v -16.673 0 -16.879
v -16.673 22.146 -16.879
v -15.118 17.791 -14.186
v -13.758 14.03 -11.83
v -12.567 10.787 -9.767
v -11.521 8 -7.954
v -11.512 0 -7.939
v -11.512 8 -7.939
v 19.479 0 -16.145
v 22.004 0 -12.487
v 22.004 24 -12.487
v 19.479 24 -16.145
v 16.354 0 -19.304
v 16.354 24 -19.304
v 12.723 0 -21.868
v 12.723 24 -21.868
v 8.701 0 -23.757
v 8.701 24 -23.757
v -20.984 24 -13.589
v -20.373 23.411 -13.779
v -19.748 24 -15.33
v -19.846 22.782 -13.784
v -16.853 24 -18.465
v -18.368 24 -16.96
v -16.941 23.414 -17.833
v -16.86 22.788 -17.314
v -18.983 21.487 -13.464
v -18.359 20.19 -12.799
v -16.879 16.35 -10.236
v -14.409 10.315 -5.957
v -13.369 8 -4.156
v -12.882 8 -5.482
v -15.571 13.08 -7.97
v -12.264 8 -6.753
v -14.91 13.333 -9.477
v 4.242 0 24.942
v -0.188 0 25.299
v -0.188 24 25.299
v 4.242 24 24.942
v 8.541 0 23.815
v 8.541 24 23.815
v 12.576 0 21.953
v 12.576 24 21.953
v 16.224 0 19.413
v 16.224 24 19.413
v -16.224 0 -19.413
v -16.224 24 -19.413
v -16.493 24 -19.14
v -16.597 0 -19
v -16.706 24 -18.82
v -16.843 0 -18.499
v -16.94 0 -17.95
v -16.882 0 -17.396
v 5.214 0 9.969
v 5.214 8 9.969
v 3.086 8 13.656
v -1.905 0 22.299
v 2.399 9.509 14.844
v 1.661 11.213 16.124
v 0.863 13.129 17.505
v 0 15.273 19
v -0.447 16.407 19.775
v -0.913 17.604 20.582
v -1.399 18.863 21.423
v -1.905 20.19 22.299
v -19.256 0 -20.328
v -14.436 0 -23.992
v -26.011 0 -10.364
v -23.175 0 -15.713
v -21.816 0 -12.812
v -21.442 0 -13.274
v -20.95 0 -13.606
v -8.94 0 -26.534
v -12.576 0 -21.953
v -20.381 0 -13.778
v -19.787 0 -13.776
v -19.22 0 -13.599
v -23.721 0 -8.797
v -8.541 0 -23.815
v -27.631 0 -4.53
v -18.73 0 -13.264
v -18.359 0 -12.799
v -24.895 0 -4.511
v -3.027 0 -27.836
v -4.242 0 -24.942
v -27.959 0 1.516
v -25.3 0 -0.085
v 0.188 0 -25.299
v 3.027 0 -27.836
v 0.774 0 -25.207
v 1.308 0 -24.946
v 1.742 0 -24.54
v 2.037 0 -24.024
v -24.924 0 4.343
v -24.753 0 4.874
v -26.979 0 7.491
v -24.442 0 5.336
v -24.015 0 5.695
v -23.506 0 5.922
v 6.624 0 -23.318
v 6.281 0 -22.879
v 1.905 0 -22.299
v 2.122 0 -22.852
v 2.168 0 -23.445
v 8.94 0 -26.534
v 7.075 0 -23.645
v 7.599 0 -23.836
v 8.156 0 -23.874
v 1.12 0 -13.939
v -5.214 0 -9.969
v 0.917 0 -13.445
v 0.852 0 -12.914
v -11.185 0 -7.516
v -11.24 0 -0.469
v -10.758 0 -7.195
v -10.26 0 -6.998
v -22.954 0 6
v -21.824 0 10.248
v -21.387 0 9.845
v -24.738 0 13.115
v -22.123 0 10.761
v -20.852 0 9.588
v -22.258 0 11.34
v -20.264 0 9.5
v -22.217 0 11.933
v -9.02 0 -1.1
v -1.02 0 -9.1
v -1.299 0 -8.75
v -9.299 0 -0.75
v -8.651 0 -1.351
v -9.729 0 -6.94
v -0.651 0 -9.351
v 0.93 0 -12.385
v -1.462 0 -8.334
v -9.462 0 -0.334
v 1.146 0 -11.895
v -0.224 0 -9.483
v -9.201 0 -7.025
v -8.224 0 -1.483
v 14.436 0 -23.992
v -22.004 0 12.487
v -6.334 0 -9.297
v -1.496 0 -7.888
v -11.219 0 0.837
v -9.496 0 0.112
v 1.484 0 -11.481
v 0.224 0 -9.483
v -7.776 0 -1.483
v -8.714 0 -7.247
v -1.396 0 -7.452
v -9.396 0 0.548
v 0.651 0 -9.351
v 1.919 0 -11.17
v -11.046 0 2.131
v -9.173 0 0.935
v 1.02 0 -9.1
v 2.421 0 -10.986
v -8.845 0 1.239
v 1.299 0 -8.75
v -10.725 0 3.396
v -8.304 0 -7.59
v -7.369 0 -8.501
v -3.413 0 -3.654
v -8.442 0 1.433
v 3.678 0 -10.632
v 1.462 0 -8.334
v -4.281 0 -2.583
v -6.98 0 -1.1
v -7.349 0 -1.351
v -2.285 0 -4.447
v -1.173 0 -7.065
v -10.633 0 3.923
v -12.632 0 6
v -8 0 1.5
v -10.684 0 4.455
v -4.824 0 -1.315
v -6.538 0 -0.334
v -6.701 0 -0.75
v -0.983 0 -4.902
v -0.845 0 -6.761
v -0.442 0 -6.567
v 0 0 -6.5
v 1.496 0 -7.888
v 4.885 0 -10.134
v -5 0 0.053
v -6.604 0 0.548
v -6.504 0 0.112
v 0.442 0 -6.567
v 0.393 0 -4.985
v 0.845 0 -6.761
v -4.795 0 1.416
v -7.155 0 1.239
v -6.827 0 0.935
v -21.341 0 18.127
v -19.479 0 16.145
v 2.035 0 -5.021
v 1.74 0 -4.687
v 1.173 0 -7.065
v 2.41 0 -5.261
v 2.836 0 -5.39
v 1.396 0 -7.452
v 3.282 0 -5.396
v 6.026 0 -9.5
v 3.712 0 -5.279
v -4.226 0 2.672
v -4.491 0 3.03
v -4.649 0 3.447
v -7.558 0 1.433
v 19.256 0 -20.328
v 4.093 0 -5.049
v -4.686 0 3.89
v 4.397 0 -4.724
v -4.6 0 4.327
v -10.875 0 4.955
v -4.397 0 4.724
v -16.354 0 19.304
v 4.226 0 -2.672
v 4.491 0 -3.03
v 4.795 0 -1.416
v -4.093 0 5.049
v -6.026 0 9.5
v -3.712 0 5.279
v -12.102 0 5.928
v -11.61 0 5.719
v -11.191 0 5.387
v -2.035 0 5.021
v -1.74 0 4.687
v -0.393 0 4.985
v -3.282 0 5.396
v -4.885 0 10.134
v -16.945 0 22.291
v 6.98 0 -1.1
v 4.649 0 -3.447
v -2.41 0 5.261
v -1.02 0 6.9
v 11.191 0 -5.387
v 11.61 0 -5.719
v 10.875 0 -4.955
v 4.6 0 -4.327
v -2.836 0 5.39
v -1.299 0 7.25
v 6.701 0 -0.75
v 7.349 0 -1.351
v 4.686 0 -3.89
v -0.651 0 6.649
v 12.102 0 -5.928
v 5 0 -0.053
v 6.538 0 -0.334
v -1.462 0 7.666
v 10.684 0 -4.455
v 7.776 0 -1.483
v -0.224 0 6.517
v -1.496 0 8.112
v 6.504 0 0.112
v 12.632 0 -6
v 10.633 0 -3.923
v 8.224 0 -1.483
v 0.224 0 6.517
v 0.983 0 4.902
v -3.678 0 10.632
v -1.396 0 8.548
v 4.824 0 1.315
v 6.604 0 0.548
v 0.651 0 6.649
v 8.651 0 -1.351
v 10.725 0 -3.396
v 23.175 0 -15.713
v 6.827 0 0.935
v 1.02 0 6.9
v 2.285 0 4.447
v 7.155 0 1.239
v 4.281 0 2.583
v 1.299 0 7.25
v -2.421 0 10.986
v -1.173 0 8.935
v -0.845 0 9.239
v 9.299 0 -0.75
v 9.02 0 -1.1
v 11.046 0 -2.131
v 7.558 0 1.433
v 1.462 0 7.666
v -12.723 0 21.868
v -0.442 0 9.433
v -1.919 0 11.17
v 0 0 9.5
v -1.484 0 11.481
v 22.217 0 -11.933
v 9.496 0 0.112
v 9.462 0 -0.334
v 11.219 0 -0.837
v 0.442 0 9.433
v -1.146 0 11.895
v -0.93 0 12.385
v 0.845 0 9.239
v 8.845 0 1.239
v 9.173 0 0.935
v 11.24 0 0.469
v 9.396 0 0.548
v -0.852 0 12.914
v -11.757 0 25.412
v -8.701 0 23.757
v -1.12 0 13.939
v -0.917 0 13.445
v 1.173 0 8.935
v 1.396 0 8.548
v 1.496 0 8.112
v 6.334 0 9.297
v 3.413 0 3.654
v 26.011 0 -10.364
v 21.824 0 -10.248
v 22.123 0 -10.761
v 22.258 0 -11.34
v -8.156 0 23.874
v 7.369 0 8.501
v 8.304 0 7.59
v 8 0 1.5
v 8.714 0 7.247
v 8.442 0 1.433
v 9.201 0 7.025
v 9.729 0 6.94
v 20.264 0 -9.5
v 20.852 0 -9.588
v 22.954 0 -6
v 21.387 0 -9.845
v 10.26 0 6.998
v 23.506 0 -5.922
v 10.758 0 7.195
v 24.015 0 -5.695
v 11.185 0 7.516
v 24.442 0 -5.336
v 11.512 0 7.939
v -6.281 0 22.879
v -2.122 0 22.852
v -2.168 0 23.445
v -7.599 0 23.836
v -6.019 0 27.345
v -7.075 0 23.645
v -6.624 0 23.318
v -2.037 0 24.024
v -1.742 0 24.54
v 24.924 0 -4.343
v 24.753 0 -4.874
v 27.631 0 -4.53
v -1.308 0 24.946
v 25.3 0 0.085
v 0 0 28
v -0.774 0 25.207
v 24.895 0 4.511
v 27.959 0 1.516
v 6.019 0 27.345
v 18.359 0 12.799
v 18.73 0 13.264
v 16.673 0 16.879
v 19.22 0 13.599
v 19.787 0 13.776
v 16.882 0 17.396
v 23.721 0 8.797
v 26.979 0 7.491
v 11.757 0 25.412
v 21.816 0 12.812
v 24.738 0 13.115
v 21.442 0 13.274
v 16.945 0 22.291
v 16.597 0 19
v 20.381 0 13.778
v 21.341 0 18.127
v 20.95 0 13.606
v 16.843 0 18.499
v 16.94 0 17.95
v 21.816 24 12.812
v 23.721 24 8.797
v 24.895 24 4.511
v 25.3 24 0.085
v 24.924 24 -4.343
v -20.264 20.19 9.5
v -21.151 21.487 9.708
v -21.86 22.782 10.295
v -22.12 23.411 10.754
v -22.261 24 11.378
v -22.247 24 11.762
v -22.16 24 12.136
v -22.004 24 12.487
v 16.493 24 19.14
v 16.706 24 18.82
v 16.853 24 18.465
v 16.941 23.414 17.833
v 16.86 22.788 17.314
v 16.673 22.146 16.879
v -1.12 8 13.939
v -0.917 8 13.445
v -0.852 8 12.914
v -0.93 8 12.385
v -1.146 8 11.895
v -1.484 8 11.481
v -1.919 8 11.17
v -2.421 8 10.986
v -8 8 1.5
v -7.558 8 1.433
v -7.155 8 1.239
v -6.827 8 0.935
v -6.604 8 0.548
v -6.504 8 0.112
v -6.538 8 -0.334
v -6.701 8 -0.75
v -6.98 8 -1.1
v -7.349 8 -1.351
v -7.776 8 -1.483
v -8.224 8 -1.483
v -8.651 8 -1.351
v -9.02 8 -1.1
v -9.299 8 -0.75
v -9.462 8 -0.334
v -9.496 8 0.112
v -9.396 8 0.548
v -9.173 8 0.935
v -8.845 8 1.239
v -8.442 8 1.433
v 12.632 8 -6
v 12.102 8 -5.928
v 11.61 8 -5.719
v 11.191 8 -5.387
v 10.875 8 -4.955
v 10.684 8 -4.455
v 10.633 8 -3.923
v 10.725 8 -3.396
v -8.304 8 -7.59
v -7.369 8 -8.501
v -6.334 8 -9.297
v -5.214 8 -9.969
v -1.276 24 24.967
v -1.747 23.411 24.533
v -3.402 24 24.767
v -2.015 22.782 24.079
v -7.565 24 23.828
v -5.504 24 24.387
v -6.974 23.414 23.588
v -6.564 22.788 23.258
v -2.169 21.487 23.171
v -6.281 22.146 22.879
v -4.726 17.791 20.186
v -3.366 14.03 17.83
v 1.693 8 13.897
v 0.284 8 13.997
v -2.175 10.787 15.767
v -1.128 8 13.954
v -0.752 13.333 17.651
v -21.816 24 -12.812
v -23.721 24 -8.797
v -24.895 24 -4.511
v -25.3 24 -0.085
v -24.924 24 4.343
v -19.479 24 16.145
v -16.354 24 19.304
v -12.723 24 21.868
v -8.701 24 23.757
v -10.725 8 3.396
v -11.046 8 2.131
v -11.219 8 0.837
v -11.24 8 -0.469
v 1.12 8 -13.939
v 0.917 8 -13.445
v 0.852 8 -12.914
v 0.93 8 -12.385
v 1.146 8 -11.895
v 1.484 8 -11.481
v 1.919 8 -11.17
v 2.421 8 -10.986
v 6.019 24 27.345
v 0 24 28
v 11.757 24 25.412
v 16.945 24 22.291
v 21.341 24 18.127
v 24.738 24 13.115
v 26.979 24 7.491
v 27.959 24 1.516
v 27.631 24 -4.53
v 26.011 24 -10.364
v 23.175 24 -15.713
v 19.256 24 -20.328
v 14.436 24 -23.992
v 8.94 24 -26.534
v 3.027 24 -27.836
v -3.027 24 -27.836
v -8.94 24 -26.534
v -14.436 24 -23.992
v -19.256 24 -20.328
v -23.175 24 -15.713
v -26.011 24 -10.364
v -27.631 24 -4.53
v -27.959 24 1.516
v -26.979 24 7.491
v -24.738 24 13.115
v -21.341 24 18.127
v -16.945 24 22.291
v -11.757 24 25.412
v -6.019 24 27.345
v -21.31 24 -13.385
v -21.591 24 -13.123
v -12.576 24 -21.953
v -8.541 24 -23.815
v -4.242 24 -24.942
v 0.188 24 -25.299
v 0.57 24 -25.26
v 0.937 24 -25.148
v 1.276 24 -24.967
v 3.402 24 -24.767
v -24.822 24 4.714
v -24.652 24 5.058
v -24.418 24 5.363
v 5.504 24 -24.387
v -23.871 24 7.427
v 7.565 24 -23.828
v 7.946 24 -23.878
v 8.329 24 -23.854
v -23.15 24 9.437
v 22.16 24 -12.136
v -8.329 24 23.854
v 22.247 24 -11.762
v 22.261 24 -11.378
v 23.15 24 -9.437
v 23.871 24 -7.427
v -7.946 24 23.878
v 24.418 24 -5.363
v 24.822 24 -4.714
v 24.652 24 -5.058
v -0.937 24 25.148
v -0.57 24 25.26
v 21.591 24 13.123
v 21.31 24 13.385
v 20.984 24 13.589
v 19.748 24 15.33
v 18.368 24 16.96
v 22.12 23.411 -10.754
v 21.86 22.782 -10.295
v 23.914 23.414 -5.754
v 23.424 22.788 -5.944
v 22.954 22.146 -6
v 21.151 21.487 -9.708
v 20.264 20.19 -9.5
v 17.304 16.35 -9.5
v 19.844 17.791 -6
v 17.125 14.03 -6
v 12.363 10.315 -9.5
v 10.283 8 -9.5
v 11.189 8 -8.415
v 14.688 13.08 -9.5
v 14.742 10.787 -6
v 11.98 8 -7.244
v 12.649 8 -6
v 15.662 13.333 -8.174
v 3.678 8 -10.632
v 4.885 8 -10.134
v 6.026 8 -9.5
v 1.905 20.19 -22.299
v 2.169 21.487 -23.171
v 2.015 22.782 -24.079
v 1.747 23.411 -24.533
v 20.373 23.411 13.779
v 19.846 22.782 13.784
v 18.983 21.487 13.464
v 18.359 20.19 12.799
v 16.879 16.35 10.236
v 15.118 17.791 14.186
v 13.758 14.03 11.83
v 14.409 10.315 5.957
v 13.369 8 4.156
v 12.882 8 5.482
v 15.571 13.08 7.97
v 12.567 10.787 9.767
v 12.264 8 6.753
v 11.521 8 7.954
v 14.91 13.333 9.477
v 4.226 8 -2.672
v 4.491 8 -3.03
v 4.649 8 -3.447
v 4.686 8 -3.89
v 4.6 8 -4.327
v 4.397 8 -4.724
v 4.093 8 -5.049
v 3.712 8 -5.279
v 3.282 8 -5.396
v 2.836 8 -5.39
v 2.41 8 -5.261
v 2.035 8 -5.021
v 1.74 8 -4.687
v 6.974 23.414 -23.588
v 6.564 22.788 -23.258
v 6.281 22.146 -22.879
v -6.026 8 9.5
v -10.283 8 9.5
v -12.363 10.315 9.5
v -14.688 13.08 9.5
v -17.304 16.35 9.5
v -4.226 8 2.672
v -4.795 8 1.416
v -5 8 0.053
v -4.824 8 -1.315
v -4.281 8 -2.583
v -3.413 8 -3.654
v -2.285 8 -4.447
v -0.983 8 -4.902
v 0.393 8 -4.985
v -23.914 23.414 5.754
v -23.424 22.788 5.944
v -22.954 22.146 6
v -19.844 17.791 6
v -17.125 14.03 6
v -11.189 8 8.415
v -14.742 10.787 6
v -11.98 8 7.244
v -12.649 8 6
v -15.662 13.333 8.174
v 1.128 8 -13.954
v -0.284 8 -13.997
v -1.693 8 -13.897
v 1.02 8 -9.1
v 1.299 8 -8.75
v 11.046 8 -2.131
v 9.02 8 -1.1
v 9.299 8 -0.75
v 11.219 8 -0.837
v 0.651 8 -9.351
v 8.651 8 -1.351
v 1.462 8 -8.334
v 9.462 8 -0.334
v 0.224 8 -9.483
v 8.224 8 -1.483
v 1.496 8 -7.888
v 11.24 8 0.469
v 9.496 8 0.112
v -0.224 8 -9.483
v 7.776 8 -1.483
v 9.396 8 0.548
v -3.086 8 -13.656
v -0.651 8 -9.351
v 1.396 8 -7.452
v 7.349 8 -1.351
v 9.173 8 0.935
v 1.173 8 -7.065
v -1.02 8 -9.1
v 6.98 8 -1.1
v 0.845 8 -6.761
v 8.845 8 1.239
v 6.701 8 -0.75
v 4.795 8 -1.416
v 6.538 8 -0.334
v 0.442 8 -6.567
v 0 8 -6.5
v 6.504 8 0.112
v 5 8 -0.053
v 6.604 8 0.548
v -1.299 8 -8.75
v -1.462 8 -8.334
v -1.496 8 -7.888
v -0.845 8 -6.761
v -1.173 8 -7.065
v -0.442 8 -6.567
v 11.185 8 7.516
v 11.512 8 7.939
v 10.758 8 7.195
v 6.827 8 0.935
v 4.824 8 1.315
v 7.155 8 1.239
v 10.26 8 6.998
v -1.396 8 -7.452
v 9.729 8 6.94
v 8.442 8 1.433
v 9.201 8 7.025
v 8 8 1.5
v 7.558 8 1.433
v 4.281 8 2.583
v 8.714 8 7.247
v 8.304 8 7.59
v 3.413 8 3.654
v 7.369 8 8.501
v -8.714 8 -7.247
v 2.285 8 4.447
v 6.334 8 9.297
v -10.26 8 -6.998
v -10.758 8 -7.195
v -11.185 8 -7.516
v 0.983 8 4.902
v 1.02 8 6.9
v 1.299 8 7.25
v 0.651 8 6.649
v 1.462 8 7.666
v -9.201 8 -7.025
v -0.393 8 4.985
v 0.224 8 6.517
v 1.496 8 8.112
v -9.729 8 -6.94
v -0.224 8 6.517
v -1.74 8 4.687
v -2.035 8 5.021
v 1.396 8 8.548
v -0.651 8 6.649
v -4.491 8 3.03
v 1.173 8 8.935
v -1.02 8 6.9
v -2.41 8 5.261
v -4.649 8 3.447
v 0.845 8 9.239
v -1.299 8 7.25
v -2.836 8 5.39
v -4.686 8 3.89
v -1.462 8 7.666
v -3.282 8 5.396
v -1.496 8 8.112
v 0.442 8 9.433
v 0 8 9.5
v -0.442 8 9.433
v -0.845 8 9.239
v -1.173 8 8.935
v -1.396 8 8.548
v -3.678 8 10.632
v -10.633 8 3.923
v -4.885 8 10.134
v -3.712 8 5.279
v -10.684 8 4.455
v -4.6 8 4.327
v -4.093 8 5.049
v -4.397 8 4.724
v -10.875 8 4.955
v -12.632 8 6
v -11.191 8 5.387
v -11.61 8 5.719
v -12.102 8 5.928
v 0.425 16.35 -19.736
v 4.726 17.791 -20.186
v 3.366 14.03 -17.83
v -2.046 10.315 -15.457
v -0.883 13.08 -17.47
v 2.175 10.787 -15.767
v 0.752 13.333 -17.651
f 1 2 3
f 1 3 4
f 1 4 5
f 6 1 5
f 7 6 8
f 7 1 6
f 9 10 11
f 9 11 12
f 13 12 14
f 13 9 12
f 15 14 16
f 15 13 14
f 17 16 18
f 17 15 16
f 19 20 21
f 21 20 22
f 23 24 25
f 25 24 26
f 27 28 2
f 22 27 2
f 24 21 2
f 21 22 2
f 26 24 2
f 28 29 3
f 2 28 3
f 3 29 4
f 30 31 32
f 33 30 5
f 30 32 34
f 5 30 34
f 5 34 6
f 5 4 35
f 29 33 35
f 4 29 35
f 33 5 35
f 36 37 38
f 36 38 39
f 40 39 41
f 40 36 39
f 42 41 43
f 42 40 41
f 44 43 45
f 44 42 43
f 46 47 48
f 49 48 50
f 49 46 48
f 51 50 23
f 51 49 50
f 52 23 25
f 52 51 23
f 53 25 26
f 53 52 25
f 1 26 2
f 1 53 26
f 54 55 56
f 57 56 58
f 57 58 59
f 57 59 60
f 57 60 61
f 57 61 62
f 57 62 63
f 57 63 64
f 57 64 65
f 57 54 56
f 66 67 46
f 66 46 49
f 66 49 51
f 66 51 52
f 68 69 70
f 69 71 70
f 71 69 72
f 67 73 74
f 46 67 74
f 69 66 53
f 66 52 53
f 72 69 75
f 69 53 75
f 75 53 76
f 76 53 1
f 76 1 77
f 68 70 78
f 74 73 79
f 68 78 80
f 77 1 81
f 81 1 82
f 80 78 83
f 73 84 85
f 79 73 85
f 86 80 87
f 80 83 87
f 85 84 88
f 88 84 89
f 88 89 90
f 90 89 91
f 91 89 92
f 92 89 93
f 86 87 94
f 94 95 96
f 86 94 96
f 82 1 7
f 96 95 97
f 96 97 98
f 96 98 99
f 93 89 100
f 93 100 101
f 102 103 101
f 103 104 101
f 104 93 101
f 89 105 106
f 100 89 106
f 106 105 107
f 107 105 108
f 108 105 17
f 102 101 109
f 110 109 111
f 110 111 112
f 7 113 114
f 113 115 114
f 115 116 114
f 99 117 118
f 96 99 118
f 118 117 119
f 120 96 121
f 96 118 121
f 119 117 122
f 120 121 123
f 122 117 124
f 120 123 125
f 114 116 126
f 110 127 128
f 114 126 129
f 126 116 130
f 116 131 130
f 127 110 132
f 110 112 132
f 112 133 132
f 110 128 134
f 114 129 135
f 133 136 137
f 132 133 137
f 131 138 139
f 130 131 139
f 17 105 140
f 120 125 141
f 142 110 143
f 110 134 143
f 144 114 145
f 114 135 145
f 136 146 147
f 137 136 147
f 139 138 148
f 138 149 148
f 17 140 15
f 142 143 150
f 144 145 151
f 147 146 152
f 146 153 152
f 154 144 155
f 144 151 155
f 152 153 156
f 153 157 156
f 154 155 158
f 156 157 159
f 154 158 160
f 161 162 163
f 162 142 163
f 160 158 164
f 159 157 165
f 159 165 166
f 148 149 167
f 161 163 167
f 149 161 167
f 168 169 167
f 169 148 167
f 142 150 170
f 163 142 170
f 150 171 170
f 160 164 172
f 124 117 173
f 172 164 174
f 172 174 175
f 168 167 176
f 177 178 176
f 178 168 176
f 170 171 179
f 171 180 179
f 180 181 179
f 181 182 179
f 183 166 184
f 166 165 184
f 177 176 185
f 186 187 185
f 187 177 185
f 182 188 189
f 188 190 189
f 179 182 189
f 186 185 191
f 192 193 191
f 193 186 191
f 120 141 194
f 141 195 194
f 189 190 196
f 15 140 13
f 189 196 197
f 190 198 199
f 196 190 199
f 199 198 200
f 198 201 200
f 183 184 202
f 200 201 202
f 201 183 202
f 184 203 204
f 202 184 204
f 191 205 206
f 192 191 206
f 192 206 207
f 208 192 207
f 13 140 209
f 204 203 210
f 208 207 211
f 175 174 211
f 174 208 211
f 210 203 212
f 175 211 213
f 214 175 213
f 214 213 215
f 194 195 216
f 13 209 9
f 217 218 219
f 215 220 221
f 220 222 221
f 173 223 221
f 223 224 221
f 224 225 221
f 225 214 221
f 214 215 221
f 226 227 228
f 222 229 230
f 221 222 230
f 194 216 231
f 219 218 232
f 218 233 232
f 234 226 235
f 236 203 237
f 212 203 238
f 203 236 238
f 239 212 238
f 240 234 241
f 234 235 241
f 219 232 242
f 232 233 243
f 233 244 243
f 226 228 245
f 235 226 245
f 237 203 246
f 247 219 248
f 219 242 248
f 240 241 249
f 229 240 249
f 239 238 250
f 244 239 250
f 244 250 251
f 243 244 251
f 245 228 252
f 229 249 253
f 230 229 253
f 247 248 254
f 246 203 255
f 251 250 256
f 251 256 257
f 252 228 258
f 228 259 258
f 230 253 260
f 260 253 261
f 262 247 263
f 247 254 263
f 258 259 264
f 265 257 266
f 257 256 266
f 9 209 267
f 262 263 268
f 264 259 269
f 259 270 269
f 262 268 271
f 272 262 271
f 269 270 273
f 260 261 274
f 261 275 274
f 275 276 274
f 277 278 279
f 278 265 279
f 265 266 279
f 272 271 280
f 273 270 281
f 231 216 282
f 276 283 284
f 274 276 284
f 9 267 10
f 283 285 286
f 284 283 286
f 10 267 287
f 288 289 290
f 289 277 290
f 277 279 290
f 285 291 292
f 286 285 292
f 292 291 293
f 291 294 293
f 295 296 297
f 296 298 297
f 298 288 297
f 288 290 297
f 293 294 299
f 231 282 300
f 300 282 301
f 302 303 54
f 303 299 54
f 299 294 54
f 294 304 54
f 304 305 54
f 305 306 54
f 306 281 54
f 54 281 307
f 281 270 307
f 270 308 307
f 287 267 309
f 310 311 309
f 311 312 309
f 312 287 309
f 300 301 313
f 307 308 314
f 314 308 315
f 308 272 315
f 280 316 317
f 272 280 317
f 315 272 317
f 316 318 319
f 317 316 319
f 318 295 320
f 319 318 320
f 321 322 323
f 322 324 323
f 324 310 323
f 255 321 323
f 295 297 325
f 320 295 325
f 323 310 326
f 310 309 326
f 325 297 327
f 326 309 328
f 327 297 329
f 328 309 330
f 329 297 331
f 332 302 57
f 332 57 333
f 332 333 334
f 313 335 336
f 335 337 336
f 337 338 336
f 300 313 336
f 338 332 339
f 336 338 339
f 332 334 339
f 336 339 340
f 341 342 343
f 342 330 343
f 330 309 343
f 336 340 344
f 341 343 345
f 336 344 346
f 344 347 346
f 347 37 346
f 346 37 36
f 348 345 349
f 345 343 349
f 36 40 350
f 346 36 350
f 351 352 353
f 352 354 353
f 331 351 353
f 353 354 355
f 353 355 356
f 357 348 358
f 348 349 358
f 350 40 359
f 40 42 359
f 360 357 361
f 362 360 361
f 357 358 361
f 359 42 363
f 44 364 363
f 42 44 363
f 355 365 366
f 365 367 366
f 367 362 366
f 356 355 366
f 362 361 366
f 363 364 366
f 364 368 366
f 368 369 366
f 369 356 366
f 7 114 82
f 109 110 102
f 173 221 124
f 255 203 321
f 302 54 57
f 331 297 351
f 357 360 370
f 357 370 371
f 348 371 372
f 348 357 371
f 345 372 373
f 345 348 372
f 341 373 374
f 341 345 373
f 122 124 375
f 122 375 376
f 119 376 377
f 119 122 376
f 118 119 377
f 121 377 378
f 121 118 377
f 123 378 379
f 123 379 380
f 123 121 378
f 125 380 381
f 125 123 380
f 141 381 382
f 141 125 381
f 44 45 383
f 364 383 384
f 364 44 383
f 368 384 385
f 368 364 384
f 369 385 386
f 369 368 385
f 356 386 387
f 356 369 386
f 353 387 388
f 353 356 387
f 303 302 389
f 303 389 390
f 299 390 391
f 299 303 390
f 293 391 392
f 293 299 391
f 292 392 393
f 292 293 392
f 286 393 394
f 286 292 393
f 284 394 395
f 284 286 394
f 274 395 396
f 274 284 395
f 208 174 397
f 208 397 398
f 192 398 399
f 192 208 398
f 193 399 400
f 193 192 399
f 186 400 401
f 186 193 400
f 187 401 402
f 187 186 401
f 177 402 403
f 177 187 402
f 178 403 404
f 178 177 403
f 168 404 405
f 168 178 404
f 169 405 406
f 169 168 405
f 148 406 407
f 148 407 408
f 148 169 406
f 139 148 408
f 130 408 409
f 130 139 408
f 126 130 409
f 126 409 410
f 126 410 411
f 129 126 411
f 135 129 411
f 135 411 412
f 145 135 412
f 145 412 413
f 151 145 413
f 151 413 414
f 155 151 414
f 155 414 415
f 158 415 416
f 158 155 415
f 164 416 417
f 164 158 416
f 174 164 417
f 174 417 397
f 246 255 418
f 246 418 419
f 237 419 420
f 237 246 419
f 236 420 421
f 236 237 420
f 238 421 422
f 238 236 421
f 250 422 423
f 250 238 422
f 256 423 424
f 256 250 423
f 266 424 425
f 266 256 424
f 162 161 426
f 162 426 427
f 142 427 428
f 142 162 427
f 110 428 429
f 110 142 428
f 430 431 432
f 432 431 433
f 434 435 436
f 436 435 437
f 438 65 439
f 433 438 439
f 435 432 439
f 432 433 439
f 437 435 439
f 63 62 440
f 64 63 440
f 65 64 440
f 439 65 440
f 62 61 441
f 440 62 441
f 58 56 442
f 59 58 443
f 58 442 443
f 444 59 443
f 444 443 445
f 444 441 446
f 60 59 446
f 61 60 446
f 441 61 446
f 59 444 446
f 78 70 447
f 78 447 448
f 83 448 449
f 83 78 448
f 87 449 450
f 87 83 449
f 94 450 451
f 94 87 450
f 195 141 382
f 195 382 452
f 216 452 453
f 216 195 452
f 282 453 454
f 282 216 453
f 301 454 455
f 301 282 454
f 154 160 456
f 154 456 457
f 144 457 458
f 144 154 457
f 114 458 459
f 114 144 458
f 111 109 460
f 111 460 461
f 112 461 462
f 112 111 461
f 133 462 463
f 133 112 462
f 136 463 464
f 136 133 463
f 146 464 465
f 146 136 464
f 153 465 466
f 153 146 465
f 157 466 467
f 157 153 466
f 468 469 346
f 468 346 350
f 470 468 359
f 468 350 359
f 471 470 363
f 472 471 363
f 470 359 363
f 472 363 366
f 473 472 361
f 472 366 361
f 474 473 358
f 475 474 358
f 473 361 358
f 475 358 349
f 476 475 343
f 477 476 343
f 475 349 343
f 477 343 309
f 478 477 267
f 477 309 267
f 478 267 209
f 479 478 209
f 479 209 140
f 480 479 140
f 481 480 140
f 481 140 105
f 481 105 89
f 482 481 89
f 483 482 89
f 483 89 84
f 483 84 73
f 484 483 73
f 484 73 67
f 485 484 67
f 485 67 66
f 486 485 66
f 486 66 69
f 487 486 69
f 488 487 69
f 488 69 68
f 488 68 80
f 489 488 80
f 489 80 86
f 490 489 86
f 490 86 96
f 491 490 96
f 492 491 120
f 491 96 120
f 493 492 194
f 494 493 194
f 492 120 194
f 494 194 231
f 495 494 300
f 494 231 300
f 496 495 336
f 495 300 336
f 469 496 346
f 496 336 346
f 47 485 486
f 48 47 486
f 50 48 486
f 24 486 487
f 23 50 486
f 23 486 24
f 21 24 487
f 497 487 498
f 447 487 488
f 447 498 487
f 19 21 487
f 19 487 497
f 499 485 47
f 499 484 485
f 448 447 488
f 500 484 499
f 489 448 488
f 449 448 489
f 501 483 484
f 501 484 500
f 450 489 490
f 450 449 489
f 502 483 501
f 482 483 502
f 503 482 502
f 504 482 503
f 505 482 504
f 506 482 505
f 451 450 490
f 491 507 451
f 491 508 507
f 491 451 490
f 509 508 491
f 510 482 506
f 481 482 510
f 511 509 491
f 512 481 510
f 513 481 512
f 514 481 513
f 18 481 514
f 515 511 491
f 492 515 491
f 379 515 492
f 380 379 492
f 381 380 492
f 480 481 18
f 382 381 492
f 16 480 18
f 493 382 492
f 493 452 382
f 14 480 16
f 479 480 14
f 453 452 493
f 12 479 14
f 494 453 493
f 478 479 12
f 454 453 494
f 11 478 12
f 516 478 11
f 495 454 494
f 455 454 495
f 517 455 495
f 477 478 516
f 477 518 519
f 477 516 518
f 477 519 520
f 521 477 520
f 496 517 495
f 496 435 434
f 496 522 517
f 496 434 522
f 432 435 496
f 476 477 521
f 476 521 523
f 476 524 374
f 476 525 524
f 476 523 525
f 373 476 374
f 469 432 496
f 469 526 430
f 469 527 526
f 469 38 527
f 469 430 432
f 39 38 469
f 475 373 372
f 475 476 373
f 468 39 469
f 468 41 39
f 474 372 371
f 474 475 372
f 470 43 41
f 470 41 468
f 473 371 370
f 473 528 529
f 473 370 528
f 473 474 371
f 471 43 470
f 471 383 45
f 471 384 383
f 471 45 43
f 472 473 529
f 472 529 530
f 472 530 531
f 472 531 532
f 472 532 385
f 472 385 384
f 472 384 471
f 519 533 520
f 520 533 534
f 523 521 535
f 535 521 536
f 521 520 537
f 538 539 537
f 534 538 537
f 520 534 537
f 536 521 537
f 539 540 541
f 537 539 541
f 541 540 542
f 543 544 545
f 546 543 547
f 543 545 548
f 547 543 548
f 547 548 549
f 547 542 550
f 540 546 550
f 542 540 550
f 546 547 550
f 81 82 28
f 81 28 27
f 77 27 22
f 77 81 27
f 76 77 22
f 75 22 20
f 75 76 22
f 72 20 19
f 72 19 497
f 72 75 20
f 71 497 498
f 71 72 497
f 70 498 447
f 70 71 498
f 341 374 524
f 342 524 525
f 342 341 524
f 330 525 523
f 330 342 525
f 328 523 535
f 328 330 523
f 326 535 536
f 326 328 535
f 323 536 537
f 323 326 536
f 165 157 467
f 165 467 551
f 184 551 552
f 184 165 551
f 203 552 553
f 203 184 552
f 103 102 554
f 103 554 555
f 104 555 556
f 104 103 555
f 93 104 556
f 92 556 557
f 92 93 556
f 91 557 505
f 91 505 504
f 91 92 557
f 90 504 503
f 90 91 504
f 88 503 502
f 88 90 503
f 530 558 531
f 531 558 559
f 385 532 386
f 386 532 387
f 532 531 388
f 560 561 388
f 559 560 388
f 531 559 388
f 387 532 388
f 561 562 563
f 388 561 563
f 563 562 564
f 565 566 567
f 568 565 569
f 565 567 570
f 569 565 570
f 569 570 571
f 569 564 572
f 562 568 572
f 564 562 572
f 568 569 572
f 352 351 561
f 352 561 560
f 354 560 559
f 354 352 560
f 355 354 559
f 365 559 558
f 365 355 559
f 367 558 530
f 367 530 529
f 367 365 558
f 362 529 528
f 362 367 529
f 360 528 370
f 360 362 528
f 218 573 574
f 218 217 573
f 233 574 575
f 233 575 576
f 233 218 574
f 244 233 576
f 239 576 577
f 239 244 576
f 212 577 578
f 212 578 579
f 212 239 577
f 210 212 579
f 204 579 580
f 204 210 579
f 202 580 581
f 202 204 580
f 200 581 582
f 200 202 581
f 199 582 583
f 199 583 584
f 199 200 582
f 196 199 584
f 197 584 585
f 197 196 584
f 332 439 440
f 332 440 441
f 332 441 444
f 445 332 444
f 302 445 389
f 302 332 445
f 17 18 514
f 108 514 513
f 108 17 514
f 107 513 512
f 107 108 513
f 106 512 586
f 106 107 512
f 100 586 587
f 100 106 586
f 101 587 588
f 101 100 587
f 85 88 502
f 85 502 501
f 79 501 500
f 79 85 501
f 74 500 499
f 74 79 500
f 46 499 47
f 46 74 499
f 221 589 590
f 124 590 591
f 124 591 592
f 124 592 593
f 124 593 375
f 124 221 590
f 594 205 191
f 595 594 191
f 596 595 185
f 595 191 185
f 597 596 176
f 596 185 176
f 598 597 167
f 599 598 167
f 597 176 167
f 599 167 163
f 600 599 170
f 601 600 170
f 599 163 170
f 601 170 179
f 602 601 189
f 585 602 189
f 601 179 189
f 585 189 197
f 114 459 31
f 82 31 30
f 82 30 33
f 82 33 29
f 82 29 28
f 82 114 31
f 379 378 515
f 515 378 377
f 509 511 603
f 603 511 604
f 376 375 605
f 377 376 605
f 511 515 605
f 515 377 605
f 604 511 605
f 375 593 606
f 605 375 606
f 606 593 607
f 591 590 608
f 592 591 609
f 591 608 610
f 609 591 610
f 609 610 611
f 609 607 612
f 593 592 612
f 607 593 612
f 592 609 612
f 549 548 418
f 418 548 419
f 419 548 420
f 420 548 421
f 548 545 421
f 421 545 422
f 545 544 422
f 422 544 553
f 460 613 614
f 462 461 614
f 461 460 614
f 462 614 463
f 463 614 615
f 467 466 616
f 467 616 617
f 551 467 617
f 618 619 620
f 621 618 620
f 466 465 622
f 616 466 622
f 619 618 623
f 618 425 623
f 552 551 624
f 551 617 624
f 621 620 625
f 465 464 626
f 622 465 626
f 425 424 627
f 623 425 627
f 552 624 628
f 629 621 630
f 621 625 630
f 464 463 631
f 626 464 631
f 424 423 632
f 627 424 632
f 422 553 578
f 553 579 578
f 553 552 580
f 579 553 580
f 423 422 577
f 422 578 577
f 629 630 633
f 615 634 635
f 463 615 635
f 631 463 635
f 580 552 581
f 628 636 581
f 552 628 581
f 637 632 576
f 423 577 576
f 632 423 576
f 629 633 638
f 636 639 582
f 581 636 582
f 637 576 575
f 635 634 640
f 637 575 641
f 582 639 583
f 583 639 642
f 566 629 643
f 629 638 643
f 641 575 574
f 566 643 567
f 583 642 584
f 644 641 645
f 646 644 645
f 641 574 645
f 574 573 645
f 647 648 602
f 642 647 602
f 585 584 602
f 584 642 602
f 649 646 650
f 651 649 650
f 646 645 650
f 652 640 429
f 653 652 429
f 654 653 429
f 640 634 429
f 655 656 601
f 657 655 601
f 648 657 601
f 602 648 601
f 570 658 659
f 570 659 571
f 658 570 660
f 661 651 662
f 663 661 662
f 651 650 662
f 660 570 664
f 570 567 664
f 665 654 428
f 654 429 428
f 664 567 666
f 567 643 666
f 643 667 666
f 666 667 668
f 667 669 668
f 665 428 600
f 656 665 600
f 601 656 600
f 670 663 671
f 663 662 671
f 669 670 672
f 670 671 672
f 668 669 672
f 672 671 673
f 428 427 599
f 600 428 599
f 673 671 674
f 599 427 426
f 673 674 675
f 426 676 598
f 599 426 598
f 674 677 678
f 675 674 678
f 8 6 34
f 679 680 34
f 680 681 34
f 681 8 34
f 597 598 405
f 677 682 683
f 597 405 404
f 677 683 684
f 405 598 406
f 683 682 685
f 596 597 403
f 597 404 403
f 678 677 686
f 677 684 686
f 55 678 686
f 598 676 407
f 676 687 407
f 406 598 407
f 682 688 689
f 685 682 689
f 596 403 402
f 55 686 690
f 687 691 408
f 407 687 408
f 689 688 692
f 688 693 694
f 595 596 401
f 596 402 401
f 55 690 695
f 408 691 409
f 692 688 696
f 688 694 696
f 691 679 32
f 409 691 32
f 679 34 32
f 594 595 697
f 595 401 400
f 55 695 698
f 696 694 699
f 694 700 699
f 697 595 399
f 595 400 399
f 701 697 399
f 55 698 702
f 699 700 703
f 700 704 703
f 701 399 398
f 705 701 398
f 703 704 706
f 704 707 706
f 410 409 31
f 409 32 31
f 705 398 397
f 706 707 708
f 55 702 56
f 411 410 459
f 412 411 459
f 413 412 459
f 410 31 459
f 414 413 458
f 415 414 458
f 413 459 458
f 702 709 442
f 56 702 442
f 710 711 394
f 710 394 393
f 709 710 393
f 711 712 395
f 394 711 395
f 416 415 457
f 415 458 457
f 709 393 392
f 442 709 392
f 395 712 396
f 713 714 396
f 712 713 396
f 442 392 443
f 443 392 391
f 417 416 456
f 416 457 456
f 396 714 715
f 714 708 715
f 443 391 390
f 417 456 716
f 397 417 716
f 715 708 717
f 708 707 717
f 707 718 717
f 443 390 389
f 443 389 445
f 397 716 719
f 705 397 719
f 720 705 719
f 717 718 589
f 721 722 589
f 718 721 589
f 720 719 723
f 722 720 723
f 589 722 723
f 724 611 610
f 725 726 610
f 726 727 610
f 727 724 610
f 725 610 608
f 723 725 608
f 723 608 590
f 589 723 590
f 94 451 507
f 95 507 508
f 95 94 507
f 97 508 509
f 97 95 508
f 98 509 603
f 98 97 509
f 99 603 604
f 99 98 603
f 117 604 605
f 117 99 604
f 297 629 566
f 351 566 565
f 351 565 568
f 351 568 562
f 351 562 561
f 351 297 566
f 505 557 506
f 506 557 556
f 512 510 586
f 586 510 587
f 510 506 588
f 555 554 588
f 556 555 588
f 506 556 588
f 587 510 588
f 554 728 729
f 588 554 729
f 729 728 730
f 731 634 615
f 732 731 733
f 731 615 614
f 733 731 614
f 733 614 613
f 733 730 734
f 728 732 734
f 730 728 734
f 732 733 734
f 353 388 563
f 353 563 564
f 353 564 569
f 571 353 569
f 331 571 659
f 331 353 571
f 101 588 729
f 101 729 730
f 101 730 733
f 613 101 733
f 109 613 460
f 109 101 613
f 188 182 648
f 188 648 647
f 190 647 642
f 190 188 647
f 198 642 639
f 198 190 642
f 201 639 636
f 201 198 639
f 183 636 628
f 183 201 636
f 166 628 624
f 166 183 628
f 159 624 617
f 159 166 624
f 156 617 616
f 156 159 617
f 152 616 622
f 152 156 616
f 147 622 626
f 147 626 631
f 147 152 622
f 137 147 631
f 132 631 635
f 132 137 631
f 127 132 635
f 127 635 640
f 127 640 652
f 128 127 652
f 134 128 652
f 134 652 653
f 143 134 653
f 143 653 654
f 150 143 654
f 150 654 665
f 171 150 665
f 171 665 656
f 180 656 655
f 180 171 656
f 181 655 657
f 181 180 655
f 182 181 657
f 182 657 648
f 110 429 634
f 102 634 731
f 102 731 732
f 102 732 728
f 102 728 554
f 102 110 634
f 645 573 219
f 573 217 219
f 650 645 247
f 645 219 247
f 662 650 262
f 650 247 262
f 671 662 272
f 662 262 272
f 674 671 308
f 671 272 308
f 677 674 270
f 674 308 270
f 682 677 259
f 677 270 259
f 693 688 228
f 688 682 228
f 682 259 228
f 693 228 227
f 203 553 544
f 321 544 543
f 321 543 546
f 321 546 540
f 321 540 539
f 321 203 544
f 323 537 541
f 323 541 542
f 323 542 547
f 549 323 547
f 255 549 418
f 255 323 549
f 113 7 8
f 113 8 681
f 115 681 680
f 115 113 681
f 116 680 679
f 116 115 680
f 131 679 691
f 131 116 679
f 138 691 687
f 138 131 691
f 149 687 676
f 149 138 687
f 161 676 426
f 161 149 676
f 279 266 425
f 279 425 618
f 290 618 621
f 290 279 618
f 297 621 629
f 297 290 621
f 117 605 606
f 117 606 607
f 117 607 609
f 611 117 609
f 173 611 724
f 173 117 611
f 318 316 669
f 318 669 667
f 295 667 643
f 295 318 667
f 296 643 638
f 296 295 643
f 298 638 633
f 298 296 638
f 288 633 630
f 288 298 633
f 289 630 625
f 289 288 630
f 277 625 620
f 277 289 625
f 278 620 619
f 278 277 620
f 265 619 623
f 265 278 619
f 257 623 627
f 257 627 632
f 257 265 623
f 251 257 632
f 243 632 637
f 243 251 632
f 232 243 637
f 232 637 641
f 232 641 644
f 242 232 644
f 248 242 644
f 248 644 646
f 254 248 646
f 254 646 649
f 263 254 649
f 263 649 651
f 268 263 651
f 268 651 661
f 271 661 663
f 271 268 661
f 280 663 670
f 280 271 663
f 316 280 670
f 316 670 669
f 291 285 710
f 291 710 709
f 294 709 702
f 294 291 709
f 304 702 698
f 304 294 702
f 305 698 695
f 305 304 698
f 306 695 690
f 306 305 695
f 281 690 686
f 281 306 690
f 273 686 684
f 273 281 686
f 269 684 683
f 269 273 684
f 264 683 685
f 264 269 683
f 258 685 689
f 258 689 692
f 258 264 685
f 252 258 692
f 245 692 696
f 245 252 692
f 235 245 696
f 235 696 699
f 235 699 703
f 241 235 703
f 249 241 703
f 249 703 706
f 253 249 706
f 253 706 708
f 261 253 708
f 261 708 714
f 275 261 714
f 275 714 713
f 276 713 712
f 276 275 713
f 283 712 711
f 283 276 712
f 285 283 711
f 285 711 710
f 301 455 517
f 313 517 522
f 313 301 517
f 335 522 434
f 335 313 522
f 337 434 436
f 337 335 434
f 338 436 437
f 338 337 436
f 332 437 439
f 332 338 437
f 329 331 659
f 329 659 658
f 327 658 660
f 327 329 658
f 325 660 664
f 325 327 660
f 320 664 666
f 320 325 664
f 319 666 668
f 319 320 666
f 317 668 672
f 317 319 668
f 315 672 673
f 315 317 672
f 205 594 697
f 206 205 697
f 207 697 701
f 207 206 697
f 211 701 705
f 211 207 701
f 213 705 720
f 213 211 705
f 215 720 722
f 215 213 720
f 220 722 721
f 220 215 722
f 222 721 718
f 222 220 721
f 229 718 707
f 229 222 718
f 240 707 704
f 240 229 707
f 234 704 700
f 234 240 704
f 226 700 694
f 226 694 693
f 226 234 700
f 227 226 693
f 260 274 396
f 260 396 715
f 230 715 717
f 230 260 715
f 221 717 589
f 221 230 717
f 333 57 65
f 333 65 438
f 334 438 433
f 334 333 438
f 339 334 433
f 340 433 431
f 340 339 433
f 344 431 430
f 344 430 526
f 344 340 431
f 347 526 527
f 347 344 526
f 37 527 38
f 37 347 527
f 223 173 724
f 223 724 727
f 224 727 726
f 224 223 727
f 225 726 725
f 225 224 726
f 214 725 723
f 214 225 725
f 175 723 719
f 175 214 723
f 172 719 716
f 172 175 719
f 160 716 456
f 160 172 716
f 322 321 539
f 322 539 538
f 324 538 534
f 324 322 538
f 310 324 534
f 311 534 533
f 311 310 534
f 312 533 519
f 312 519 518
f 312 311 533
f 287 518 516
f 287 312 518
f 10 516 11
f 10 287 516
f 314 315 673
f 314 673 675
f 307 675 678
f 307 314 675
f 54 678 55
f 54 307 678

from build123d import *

# Parameters (mm, degrees)
SKETCH1_R           = 28
BOSS_EXTRUDE1_DEPTH = 24
SKETCH6_R           = 1.9
CUT_EXTRUDE6_DEPTH  = 24
CUT_EXTRUDE7_DEPTH  = 24
CIRPATTERN1_COUNT   = 6
SKETCH17_R          = 1.5
CUT_EXTRUDE9_DEPTH  = 8
SKETCH18_R          = 1.607527434
CUT_EXTRUDE10_DEPTH = 8


with BuildPart() as part:
    # Sketch1 → Boss-Extrude1 (new body)
    with BuildSketch(Plane(origin=(0, 0, 0), x_dir=(1, 0, 0), z_dir=(0, 1, 0))):
        with Locations(Location((0, 0, 0), (0, 0, 270))):
            Circle(SKETCH1_R)
    extrude(amount=BOSS_EXTRUDE1_DEPTH)

    # Sketch6 → Cut-Extrude6 (cut)
    with BuildSketch(Plane(origin=(0, 0, 0), x_dir=(1, 0, 0), z_dir=(0, 1, 0))):
        with Locations(Location((0, 0, 0), (0, 0, 270))):
            Circle(SKETCH6_R)
    extrude(amount=CUT_EXTRUDE6_DEPTH, mode=Mode.SUBTRACT)

    # Sketch3 → Cut-Extrude7 (cut)
    with BuildSketch(Plane(origin=(0, 0, 0), x_dir=(1, 0, 0), z_dir=(0, 1, 0))):
        with BuildLine():
            Line((6.025985397, 9.5), (20.264254242, 9.5))
            ThreePointArc((20.264254242, 9.5), (21.992584206, 10.493582822), (22.003675207, 12.487124464))
            ThreePointArc((22.003675207, 12.487124464), (16.353652552, 19.304094079), (8.700746754, 23.756830721))
            ThreePointArc((8.700746754, 23.756830721), (7.330784322, 23.758890252), (6.280889879, 22.878820388))
            Line((6.280889879, 22.878820388), (1.119750126, 13.939464109))
            ThreePointArc((1.119750126, 13.939464109), (1.021677147, 12.132837227), (2.421340415, 10.986337451))
            ThreePointArc((2.421340415, 10.986337451), (4.288546152, 10.400522675), (6.025985397, 9.5))
        make_face()
    cut_extrude7 = extrude(amount=CUT_EXTRUDE7_DEPTH, mode=Mode.SUBTRACT)

    # CirPattern1: Cut-Extrude7 ×6 about axis
    cirpattern1_axis = Axis((0, 0, 0), (0, 1, 0))
    for i in range(1, CIRPATTERN1_COUNT):
        add(cut_extrude7.rotate(cirpattern1_axis, i * 360 / CIRPATTERN1_COUNT), mode=Mode.SUBTRACT)

    # Sketch14 → Revolve1 (revolve)
    with BuildSketch(Plane.XY):
        Polygon((25.5, 13), (25.5, 12), (28, 12), (28, 14), align=None)
    revolve1 = revolve(axis=Axis((0, 24, 0), (0, -1, 0)))

    # Mirror11: Revolve1 across plane
    add(revolve1.mirror(Plane.ZX.offset(12)))

    # Sketch15 → Cut-Revolve5 (revolve, cut)
    with BuildSketch(Plane.XY, mode=Mode.PRIVATE) as cut_revolve5_sk:
        Polygon((5, 8), (5, 0), (0, 0), (0, 8), (0, 24), (25, 24), (14, 8), align=None)
    revolve(cut_revolve5_sk.sketch.rotate(Axis((0, 8, 0), (0, -1, 0)), 90), axis=Axis((0, 8, 0), (0, -1, 0)), mode=Mode.SUBTRACT)

    # Sketch17 → Cut-Extrude9 (cut)
    with BuildSketch(Plane(origin=(0, 0, 0), x_dir=(1, 0, 0), z_dir=(0, 1, 0))):
        with Locations(Location((0, 8, 0), (0, 0, 270))):
            Circle(SKETCH17_R)
        with Locations(Location((8, 0, 0), (0, 0, 270))):
            Circle(SKETCH17_R)
        with Locations(Location((0, -8, 0), (0, 0, 270))):
            Circle(SKETCH17_R)
        with Locations(Location((-8, 0, 0), (0, 0, 270))):
            Circle(SKETCH17_R)
    extrude(amount=CUT_EXTRUDE9_DEPTH, mode=Mode.SUBTRACT)

    # Sketch18 → Cut-Extrude10 (cut)
    with BuildSketch(Plane(origin=(0, 0, 0), x_dir=(1, 0, 0), z_dir=(0, 1, 0))):
        with Locations((3.080772614, 3.800674665)):
            Circle(SKETCH18_R)
        with Locations((-3.080772614, -3.800674665)):
            Circle(SKETCH18_R)
    extrude(amount=CUT_EXTRUDE10_DEPTH, mode=Mode.SUBTRACT)


solid = part.part
